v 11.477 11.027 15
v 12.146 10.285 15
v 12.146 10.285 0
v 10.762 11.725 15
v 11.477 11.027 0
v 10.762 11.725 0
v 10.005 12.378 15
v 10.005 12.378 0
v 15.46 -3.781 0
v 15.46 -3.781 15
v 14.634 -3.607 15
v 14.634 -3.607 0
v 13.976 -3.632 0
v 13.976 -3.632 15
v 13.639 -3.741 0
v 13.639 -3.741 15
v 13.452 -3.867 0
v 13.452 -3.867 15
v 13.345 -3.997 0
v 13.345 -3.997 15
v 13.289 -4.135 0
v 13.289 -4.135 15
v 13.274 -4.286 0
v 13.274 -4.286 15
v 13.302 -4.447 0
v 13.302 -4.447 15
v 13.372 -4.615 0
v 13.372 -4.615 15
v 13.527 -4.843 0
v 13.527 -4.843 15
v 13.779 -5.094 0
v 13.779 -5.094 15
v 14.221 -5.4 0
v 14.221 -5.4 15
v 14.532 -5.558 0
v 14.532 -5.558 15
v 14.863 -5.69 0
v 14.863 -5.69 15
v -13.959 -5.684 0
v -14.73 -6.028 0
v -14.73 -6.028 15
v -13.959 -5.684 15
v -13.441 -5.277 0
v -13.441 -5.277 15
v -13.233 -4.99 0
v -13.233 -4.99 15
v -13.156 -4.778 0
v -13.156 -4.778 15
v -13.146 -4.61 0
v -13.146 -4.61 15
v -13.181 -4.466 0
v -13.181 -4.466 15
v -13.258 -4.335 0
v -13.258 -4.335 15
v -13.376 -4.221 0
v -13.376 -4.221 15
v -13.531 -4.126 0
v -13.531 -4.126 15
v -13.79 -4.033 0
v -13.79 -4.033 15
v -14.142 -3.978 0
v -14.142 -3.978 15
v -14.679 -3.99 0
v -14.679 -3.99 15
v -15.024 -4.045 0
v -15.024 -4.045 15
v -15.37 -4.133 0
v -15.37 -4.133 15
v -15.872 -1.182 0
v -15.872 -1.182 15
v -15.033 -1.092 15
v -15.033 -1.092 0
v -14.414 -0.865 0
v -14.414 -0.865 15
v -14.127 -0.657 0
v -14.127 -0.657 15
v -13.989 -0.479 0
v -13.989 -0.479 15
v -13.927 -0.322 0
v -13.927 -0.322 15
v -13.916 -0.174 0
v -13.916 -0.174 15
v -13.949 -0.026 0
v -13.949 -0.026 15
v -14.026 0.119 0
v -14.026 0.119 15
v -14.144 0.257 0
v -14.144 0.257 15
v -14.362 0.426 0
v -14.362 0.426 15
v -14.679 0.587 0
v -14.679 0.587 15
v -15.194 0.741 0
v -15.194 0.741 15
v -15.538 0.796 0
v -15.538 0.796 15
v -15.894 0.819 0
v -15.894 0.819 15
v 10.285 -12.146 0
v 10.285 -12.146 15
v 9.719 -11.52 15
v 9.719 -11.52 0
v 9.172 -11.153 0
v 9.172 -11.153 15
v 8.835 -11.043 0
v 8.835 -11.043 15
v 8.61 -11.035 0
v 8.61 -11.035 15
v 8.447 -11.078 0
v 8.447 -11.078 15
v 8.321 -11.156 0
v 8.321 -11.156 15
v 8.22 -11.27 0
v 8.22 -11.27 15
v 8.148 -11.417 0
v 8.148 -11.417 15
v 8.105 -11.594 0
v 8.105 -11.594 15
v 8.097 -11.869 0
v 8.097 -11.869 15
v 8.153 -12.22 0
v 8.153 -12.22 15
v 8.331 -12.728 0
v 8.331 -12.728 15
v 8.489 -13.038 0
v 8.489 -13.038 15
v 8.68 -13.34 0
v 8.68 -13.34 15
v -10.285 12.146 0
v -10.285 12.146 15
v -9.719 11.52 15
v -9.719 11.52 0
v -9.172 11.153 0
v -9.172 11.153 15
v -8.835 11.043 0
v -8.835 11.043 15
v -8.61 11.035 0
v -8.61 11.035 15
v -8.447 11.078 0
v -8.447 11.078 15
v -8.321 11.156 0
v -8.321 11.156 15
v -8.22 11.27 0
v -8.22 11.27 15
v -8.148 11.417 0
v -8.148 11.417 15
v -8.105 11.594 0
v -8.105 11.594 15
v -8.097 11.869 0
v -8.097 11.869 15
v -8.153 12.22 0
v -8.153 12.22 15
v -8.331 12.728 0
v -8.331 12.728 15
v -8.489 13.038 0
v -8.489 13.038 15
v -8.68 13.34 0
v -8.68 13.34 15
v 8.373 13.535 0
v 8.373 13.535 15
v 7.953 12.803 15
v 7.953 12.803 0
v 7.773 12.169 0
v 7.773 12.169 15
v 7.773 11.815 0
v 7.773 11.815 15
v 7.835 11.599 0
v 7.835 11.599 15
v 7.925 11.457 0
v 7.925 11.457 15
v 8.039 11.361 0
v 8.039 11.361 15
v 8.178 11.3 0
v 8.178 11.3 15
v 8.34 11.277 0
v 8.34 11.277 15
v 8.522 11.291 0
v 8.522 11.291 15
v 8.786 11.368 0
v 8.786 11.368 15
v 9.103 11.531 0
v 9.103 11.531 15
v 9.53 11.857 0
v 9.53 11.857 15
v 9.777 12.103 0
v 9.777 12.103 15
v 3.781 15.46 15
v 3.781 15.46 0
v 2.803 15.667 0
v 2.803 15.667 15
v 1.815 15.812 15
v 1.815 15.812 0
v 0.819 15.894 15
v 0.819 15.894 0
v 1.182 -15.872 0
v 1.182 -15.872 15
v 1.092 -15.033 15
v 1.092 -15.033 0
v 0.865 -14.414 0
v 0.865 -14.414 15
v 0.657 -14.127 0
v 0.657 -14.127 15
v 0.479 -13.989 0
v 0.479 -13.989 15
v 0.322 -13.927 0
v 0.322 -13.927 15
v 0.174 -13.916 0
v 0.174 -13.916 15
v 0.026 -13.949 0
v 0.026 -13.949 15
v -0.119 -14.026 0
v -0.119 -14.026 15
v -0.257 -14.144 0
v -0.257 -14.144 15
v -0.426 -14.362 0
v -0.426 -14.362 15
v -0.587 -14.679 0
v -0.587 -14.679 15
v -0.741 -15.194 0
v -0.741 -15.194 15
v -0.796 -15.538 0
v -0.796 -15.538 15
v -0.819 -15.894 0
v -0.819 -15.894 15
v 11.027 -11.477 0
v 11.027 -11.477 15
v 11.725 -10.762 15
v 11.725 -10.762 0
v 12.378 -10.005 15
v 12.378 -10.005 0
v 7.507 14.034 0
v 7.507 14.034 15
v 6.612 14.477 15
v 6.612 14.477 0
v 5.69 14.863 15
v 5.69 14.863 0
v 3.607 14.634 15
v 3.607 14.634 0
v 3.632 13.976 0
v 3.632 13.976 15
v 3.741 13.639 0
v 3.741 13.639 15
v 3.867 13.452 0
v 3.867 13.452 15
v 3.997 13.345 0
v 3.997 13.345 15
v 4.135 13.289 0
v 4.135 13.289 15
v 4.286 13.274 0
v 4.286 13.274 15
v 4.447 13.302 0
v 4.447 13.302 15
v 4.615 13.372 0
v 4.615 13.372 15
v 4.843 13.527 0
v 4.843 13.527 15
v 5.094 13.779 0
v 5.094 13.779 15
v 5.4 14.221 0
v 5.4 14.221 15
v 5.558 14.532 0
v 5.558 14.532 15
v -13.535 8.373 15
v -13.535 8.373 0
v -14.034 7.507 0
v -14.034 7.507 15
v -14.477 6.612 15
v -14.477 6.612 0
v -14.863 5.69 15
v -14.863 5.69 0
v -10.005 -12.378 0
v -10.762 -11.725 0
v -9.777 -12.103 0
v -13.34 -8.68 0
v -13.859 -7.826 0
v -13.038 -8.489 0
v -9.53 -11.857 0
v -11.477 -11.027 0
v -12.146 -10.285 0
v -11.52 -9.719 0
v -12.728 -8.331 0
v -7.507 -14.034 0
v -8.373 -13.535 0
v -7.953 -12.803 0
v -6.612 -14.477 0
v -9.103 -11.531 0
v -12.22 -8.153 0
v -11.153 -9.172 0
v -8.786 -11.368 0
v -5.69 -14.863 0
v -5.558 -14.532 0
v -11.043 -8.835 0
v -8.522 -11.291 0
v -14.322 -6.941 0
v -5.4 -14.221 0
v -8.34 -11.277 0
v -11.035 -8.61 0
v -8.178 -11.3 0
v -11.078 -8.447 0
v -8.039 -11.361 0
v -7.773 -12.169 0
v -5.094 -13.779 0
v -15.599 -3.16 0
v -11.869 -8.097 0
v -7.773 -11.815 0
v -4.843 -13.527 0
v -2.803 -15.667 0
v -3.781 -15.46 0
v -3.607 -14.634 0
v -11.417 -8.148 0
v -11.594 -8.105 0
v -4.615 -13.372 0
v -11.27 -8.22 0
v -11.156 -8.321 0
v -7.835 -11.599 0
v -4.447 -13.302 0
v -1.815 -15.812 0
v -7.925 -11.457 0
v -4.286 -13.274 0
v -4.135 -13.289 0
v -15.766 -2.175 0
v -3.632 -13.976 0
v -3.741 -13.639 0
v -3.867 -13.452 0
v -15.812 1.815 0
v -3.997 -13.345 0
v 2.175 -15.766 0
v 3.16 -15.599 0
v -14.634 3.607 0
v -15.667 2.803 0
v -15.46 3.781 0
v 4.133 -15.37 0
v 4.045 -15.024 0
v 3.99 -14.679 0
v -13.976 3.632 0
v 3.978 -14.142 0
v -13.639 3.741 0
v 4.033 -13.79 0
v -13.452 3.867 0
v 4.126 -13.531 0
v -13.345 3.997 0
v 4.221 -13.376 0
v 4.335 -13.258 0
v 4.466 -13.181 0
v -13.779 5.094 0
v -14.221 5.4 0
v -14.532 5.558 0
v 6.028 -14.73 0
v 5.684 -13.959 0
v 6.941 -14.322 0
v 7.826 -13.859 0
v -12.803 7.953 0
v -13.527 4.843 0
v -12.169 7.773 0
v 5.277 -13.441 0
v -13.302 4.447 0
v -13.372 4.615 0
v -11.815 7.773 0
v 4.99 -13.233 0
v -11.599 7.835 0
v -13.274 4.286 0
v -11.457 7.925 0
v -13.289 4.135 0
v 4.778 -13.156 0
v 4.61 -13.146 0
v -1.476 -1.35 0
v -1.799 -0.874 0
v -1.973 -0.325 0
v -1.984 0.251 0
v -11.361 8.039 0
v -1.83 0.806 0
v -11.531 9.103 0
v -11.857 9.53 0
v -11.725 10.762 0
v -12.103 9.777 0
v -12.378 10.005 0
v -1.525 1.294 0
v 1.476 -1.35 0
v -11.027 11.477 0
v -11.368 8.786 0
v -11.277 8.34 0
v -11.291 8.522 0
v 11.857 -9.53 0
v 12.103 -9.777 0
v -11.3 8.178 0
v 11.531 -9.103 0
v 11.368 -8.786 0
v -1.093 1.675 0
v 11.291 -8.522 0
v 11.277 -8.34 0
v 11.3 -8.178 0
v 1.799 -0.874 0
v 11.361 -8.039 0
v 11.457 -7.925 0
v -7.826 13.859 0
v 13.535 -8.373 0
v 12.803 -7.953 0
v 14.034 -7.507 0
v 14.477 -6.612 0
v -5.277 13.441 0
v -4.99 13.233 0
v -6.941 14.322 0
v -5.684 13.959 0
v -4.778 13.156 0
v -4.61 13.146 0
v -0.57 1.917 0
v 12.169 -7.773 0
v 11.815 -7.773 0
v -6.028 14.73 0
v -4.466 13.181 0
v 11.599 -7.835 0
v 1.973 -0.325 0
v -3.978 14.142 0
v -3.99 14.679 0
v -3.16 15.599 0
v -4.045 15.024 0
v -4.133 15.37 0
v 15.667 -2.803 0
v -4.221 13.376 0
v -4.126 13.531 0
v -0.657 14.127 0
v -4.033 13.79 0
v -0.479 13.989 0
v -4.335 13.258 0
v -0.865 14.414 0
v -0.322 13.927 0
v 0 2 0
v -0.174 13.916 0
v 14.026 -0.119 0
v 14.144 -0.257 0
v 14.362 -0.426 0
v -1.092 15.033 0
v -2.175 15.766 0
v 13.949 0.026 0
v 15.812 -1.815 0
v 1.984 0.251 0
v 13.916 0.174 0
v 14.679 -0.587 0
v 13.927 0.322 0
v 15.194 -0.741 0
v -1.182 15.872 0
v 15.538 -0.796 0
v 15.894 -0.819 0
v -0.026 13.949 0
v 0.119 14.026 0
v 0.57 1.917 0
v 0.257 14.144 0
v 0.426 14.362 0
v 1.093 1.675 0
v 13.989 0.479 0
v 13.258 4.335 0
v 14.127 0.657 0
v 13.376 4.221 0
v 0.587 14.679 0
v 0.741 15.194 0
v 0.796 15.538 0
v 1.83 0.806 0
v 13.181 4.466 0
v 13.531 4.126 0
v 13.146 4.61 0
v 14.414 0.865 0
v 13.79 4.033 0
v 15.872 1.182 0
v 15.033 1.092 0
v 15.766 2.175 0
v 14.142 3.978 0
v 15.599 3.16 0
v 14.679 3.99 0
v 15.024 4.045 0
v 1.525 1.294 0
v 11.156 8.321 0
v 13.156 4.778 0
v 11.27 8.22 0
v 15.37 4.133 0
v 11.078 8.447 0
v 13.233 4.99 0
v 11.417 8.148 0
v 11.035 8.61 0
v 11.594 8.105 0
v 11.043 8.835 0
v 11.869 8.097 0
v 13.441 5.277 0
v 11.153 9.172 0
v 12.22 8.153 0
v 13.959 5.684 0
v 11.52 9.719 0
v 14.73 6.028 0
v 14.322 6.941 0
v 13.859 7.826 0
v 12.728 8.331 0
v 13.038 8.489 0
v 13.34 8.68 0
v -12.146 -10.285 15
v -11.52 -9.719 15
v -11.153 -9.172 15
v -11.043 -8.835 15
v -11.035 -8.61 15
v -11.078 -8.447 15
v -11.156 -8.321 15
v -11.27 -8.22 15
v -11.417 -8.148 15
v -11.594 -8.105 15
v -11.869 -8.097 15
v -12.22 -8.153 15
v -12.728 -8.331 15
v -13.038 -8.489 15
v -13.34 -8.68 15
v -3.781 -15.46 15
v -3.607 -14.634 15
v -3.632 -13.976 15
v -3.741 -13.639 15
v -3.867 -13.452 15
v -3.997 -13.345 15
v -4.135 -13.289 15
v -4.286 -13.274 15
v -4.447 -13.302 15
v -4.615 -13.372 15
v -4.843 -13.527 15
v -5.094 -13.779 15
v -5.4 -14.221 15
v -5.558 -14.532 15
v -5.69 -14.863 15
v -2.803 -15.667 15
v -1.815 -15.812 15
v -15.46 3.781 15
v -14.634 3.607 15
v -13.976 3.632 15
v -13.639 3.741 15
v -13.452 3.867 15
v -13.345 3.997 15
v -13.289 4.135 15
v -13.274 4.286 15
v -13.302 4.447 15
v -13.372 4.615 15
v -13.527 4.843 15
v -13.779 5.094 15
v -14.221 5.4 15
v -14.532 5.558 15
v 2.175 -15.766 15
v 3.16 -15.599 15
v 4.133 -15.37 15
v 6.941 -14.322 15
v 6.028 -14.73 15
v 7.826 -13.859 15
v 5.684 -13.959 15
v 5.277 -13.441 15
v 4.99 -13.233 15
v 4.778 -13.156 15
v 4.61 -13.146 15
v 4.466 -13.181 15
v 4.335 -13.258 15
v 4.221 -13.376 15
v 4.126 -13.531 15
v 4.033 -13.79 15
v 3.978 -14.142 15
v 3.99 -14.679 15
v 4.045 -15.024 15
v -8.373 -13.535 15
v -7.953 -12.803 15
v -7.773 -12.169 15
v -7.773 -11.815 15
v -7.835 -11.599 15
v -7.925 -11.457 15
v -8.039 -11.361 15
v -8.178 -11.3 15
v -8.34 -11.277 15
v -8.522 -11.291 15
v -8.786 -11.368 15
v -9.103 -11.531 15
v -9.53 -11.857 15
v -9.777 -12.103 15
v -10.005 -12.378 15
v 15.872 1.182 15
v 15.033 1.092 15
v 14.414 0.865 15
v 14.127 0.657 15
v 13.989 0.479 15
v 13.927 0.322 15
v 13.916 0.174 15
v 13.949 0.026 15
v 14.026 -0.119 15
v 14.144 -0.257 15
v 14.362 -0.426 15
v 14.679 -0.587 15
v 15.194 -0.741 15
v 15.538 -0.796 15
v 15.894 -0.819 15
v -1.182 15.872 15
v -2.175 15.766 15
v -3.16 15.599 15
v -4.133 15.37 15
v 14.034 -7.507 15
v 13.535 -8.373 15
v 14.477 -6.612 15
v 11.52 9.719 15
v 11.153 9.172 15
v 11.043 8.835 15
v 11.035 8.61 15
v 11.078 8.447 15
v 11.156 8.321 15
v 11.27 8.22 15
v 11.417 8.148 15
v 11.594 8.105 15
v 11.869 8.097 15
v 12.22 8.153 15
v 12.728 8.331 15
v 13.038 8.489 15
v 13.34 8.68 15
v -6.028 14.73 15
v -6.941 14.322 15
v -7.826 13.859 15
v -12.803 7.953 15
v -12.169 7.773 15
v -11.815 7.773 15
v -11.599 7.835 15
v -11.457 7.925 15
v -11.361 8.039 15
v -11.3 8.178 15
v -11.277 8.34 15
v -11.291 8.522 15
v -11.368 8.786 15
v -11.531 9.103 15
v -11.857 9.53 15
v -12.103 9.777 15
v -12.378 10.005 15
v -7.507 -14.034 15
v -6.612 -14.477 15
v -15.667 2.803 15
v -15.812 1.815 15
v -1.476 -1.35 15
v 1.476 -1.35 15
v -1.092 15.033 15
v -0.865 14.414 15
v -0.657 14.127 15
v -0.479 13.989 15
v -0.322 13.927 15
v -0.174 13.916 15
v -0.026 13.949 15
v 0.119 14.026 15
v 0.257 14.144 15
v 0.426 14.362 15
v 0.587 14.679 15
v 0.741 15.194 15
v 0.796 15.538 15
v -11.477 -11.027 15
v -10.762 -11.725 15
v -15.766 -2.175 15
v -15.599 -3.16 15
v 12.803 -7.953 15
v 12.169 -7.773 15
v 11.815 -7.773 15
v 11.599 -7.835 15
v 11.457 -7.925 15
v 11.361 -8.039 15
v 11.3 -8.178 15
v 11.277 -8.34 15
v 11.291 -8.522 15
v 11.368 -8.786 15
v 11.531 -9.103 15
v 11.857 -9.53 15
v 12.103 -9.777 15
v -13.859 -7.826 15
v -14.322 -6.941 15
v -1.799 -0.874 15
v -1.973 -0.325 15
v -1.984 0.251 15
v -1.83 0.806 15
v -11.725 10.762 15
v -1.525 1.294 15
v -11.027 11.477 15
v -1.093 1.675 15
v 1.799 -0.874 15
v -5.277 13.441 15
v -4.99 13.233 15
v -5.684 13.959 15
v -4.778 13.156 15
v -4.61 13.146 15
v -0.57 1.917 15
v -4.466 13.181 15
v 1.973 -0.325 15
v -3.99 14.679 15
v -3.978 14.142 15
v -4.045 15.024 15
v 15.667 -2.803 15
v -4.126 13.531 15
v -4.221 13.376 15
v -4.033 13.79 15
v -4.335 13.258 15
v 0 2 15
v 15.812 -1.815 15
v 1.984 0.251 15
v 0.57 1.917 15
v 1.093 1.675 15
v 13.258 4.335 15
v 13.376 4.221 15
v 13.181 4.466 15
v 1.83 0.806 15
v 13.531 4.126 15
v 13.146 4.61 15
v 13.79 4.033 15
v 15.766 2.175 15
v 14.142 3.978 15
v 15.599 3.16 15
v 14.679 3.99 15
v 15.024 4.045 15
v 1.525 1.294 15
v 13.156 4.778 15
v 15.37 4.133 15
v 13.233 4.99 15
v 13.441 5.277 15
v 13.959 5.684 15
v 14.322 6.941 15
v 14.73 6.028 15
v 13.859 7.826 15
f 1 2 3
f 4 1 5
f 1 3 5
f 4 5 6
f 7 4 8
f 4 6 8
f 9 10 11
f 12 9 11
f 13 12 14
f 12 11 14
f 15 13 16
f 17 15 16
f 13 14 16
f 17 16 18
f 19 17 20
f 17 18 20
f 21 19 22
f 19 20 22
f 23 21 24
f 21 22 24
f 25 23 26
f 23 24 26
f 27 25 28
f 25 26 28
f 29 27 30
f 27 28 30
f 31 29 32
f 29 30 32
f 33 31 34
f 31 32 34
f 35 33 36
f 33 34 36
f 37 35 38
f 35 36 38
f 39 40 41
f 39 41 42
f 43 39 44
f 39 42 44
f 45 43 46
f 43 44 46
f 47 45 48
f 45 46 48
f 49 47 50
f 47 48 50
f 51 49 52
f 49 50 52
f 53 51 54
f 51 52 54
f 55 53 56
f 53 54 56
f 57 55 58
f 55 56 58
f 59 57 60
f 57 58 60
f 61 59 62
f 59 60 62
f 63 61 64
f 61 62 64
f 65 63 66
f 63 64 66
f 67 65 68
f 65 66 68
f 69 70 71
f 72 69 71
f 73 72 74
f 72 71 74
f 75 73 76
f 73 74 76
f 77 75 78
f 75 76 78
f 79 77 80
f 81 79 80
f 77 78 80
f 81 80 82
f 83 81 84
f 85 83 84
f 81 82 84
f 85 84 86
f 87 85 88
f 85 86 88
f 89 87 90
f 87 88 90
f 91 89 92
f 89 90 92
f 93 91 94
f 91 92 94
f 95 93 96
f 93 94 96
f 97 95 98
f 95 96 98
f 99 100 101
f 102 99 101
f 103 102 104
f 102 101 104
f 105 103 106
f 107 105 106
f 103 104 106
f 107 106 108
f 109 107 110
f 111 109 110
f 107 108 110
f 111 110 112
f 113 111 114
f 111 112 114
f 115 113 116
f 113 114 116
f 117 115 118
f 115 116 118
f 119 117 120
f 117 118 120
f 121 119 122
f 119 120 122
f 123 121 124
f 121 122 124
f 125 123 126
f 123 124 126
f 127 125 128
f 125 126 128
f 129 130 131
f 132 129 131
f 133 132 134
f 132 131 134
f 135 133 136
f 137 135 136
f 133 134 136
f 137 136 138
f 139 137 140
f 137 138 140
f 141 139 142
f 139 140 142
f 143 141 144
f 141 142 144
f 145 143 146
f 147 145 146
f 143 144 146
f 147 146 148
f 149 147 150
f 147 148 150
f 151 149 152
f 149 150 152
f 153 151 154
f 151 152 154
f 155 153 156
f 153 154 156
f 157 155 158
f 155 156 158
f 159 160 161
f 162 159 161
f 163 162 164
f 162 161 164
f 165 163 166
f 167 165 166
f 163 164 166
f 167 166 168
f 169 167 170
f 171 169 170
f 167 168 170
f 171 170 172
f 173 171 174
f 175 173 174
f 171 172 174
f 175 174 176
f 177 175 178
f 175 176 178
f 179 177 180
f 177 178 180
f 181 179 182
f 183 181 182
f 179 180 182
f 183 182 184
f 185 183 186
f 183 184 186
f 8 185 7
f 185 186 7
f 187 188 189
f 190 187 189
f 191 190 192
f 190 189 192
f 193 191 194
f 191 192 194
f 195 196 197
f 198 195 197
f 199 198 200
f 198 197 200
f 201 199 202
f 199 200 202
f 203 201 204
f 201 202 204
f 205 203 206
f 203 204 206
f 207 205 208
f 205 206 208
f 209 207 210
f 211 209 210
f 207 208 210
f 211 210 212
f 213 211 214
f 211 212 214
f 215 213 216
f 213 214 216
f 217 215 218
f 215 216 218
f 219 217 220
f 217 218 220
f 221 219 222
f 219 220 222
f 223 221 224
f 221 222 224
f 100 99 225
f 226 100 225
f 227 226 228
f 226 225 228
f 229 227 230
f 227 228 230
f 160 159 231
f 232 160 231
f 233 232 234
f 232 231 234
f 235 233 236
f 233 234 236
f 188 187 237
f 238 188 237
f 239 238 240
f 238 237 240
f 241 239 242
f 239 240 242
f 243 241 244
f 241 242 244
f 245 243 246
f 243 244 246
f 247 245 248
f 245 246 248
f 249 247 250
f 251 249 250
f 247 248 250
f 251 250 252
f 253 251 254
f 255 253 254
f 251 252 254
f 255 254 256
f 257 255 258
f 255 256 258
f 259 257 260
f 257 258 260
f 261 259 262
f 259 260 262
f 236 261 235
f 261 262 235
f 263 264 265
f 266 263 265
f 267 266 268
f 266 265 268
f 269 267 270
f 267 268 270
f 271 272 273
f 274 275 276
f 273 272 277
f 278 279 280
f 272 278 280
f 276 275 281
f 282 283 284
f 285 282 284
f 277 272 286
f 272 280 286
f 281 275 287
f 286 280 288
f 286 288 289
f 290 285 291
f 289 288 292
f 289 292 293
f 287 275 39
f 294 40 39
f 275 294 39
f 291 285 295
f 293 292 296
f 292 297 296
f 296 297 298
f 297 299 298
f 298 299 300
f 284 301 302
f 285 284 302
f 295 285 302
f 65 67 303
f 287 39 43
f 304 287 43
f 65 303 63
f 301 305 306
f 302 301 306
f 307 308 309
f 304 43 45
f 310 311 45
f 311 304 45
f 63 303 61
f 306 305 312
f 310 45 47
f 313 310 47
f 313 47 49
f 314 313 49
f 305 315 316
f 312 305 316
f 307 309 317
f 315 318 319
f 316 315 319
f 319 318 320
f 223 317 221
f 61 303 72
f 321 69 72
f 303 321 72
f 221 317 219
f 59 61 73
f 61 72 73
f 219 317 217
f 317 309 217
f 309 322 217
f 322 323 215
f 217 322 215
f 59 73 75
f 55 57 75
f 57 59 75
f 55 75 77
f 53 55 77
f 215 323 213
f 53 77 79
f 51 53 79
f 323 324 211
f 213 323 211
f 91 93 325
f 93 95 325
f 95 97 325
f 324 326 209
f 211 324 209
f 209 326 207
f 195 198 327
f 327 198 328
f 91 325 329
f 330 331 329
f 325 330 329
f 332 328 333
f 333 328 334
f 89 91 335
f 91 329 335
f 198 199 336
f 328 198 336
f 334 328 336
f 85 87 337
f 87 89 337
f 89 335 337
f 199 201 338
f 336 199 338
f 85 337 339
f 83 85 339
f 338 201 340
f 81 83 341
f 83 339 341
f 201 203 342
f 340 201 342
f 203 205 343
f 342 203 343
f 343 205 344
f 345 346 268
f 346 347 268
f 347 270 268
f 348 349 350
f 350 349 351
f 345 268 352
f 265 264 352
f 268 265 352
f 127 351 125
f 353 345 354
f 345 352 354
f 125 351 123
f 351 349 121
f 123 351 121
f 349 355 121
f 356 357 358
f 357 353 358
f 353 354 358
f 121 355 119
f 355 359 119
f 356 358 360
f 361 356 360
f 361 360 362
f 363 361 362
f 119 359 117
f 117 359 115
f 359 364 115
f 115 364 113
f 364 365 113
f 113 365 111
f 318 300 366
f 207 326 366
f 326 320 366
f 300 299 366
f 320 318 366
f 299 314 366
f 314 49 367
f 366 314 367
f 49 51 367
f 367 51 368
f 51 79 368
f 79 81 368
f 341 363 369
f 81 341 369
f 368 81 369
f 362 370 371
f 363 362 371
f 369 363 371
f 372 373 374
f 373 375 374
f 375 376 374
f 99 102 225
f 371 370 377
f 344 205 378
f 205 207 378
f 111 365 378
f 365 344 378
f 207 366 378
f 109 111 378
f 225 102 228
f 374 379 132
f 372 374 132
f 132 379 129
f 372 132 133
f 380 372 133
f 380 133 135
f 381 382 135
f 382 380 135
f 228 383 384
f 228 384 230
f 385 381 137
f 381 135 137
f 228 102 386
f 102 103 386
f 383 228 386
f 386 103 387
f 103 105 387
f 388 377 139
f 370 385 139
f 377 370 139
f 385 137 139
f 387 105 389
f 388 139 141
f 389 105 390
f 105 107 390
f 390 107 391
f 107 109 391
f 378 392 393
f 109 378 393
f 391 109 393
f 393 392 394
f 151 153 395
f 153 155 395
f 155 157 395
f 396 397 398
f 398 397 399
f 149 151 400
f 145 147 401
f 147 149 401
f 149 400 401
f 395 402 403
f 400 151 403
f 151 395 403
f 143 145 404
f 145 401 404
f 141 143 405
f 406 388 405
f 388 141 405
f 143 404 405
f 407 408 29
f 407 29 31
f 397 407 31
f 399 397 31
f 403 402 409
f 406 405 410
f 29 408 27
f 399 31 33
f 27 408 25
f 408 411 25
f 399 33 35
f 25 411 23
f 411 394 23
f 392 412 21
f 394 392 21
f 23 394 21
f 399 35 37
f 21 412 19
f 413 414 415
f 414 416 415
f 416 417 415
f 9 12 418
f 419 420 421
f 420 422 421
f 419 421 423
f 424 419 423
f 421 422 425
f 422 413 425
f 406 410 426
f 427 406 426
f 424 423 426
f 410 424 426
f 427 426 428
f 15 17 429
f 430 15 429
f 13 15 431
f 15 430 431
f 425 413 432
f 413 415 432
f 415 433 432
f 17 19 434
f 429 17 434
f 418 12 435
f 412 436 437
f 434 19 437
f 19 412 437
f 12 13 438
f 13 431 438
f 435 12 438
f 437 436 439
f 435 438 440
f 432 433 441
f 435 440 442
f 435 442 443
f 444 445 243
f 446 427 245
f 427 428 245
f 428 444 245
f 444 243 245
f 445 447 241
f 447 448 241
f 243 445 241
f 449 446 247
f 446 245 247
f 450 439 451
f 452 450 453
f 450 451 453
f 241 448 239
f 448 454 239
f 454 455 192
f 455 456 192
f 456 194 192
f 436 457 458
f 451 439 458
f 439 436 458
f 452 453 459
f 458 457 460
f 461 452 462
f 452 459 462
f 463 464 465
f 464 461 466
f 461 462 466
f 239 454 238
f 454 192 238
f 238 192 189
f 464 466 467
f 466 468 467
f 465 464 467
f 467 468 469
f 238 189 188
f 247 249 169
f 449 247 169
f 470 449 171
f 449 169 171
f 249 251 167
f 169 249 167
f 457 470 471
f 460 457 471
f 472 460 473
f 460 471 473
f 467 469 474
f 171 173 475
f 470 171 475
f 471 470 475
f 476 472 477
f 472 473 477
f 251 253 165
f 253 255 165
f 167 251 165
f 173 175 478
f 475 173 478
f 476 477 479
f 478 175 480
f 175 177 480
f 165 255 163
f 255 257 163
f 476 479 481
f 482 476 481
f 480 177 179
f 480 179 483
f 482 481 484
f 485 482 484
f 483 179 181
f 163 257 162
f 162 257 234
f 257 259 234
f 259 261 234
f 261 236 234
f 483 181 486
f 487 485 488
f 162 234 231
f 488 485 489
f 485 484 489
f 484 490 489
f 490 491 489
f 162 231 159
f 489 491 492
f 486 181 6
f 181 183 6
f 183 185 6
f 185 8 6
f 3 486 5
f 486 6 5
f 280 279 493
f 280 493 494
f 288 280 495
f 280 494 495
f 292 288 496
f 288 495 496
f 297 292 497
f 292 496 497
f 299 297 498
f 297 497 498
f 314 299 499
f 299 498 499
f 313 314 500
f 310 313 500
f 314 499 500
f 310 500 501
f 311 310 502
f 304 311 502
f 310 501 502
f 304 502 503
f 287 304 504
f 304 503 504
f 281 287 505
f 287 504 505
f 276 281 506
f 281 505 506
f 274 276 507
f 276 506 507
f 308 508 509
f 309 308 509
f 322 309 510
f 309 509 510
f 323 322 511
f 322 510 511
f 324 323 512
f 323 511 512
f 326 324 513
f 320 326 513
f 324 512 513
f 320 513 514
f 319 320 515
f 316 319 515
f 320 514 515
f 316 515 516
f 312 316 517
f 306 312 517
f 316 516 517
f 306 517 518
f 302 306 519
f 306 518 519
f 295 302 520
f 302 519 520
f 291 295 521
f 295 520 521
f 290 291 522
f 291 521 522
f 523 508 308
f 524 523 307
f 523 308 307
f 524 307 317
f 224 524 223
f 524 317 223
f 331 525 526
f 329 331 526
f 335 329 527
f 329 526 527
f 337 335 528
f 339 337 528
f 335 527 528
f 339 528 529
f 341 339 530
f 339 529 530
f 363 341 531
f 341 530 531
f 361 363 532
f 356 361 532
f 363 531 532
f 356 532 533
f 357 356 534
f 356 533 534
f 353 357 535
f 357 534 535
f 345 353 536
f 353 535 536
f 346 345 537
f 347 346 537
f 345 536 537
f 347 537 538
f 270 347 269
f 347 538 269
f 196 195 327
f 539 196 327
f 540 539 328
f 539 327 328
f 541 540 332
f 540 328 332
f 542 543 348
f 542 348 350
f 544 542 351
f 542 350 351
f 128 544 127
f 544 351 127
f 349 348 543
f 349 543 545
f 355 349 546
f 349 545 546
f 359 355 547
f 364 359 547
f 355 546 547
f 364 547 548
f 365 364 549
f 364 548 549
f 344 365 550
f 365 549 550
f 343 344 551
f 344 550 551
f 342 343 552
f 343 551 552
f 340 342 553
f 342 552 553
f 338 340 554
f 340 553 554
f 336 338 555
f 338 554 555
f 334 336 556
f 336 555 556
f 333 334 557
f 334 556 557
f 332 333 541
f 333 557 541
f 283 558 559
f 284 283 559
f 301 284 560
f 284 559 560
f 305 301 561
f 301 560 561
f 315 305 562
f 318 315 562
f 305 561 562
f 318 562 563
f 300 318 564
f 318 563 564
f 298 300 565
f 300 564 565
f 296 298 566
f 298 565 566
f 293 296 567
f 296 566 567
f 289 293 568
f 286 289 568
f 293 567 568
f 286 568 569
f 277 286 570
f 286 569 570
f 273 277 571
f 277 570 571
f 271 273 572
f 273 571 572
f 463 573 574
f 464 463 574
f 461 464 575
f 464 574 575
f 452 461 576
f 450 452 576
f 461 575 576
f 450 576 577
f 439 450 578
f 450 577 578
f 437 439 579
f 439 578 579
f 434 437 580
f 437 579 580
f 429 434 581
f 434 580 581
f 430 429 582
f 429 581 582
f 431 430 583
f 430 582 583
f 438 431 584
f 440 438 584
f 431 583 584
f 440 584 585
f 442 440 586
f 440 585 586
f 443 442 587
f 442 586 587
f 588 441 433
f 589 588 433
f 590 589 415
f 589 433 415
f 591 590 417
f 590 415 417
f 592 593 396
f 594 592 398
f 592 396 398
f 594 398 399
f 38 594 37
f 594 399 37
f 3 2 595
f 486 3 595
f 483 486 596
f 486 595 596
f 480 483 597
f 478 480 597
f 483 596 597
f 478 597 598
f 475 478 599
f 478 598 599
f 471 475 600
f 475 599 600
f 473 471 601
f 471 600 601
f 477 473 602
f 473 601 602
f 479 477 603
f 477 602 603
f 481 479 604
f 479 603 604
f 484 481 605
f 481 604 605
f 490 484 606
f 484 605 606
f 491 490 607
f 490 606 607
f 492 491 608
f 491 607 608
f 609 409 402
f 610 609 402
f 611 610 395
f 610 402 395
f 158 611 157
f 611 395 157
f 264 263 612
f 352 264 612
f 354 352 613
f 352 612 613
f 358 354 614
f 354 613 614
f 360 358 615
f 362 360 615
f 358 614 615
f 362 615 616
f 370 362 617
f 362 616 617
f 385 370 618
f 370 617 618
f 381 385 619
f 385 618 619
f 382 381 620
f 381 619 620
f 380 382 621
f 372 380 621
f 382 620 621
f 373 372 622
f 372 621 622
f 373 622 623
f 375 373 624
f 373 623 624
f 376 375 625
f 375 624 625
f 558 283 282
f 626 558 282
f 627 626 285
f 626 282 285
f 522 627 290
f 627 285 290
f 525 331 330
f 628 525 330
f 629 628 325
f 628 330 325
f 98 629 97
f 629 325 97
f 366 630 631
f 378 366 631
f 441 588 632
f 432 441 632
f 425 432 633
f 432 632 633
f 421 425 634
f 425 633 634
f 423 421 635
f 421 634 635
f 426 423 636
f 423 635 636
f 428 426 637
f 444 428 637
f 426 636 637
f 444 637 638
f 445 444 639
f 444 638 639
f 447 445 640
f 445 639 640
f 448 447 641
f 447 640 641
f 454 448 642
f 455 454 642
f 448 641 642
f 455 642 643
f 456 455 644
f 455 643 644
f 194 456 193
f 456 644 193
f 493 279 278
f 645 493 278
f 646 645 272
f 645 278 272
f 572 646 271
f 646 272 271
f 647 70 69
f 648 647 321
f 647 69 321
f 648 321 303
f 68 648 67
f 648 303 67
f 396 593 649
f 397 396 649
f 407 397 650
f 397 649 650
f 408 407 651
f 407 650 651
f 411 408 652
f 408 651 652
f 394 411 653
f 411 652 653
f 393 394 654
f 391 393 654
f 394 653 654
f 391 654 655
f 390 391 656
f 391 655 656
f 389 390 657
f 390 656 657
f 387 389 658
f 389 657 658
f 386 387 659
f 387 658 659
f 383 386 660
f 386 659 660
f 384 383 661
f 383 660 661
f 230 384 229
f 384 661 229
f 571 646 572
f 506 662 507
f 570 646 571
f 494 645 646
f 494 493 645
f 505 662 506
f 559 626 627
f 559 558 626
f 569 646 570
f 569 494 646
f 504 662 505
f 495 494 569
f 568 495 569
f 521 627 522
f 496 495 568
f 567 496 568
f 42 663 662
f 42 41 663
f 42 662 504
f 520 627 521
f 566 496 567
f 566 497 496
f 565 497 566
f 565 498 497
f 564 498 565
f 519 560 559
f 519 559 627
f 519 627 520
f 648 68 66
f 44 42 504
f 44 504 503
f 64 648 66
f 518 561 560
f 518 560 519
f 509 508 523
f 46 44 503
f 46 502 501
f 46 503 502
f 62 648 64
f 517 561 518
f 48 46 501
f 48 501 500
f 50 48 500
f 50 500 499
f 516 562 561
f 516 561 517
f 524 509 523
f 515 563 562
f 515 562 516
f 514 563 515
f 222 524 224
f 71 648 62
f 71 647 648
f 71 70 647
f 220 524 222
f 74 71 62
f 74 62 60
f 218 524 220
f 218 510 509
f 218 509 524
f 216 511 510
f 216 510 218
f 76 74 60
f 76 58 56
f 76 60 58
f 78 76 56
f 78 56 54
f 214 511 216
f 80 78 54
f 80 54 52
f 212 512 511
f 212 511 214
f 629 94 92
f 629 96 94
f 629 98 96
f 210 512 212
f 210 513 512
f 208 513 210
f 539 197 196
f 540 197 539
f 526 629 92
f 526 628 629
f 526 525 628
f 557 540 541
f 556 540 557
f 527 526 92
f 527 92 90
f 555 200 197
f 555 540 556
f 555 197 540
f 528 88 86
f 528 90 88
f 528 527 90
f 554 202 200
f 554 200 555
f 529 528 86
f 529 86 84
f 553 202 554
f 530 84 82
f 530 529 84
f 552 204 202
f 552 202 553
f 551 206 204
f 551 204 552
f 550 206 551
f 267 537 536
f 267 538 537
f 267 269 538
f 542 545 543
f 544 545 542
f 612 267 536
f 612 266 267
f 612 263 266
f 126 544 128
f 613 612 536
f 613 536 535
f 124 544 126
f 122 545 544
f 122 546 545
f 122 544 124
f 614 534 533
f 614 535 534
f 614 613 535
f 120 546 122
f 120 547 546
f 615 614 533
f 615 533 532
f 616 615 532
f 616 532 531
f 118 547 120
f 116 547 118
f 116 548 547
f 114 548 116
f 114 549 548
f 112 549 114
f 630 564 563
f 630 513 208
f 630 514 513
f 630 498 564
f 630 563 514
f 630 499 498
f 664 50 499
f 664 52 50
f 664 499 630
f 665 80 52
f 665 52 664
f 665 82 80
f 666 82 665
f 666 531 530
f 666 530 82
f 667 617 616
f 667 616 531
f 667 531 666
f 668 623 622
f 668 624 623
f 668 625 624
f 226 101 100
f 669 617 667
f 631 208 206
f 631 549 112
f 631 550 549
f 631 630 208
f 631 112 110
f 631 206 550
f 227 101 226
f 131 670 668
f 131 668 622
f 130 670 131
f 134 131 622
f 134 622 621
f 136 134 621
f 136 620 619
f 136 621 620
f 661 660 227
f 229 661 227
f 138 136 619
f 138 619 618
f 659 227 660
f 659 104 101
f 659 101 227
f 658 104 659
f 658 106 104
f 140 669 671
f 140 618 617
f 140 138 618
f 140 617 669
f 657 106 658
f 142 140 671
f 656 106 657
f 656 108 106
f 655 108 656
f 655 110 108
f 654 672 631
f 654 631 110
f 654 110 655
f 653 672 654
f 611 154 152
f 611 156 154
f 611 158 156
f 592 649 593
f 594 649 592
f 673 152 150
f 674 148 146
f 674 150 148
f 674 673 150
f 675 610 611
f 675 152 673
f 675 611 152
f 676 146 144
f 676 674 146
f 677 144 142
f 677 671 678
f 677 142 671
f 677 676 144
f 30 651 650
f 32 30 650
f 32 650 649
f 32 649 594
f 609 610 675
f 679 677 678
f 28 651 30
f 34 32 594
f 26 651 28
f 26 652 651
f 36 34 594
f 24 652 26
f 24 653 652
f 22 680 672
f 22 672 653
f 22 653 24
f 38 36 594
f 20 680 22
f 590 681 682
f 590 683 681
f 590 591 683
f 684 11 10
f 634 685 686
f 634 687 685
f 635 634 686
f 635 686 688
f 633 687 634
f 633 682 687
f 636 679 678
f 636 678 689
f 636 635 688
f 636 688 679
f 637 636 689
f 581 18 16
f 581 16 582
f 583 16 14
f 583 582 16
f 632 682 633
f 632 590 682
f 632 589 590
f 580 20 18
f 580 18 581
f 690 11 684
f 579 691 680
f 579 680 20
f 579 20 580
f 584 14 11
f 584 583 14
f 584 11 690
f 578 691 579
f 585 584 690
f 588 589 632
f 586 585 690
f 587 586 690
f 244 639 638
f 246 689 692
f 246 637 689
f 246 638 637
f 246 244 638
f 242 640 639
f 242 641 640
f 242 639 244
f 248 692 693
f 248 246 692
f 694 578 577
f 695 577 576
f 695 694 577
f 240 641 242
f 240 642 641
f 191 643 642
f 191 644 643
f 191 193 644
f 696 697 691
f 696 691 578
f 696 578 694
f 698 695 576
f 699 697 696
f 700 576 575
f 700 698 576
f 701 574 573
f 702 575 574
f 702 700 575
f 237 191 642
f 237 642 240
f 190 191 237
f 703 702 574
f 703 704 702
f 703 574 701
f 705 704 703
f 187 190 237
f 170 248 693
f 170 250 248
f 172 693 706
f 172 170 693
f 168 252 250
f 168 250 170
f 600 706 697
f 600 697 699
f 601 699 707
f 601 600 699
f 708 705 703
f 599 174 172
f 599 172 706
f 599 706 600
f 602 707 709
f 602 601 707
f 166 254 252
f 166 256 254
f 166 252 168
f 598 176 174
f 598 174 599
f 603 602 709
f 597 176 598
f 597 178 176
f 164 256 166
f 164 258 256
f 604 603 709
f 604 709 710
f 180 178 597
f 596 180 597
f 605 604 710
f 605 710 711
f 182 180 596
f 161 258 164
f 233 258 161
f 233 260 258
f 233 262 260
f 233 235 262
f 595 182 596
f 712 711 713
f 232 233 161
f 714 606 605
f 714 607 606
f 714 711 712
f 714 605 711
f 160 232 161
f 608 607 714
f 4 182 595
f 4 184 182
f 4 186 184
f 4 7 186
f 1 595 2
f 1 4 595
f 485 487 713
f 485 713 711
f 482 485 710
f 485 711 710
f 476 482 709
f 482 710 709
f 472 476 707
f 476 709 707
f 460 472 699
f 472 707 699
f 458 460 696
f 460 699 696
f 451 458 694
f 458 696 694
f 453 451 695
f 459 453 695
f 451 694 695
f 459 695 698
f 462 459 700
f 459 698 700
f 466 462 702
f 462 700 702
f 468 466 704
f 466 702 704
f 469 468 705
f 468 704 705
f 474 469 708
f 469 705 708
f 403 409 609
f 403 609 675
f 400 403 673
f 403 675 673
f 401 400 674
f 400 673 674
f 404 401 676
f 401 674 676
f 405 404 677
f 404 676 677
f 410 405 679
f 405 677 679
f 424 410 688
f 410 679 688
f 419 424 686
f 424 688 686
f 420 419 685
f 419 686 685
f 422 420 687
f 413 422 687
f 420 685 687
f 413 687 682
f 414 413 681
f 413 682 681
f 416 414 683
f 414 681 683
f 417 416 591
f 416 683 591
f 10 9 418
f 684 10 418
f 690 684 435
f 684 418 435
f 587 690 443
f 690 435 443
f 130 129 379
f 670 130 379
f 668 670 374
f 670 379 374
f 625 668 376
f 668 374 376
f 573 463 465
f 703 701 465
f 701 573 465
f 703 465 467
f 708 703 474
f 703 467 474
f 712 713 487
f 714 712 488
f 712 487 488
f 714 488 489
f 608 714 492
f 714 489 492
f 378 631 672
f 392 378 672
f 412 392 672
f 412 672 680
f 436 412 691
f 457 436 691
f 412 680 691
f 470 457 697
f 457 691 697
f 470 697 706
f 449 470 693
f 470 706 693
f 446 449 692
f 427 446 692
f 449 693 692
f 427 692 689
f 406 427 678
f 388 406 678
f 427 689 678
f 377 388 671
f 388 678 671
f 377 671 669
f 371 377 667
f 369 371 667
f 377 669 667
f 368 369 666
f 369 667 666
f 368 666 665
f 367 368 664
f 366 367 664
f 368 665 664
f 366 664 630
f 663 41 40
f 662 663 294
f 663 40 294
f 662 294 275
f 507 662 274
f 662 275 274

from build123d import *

# Parameters (mm, degrees)
SKETCH_1_R               = 15.91549431
EXTRUDE_1_DEPTH          = 15
CUT_EXTRUDE_1_DEPTH      = 15
SKETCH_3_RX              = 2
SKETCH_3_RY              = 1
CUT_EXTRUDE_2_DEPTH      = 15
PATTERN_CIRCULAR_1_COUNT = 20


with BuildPart() as part:
    # Эскиз1 → Бобышка-Вытянуть1 (new body)
    with BuildSketch(Plane.XY):
        Circle(SKETCH_1_R)
    extrude(amount=EXTRUDE_1_DEPTH)

    # Эскиз2 → Вырез-Вытянуть1 (cut)
    with BuildSketch(Plane.XY.offset(15)):
        with BuildLine():
            Line((-1.475635456, -1.35), (1.475635456, -1.35))
            ThreePointArc((1.475635456, -1.35), (0, 2), (-1.475635456, -1.35))
        make_face()
    extrude(amount=-CUT_EXTRUDE_1_DEPTH, mode=Mode.SUBTRACT)

    # Эскиз3 → Вырез-Вытянуть2 (cut)
    with BuildSketch(Plane.XY.offset(15)):
        with Locations(Location((12.768681862, 9.500722217), (0, 0, 34.851328061))):
            Ellipse(SKETCH_3_RX, SKETCH_3_RY)
    cut_extrude_2 = extrude(amount=-CUT_EXTRUDE_2_DEPTH, mode=Mode.SUBTRACT)

    # Круговой массив1: Вырез-Вытянуть2 ×20 about axis
    pattern_circular_1_axis = Axis((0, 0, 15), (0, 0, 1))
    for i in range(1, PATTERN_CIRCULAR_1_COUNT):
        add(cut_extrude_2.rotate(pattern_circular_1_axis, i * 360 / PATTERN_CIRCULAR_1_COUNT), mode=Mode.SUBTRACT)


solid = part.part
